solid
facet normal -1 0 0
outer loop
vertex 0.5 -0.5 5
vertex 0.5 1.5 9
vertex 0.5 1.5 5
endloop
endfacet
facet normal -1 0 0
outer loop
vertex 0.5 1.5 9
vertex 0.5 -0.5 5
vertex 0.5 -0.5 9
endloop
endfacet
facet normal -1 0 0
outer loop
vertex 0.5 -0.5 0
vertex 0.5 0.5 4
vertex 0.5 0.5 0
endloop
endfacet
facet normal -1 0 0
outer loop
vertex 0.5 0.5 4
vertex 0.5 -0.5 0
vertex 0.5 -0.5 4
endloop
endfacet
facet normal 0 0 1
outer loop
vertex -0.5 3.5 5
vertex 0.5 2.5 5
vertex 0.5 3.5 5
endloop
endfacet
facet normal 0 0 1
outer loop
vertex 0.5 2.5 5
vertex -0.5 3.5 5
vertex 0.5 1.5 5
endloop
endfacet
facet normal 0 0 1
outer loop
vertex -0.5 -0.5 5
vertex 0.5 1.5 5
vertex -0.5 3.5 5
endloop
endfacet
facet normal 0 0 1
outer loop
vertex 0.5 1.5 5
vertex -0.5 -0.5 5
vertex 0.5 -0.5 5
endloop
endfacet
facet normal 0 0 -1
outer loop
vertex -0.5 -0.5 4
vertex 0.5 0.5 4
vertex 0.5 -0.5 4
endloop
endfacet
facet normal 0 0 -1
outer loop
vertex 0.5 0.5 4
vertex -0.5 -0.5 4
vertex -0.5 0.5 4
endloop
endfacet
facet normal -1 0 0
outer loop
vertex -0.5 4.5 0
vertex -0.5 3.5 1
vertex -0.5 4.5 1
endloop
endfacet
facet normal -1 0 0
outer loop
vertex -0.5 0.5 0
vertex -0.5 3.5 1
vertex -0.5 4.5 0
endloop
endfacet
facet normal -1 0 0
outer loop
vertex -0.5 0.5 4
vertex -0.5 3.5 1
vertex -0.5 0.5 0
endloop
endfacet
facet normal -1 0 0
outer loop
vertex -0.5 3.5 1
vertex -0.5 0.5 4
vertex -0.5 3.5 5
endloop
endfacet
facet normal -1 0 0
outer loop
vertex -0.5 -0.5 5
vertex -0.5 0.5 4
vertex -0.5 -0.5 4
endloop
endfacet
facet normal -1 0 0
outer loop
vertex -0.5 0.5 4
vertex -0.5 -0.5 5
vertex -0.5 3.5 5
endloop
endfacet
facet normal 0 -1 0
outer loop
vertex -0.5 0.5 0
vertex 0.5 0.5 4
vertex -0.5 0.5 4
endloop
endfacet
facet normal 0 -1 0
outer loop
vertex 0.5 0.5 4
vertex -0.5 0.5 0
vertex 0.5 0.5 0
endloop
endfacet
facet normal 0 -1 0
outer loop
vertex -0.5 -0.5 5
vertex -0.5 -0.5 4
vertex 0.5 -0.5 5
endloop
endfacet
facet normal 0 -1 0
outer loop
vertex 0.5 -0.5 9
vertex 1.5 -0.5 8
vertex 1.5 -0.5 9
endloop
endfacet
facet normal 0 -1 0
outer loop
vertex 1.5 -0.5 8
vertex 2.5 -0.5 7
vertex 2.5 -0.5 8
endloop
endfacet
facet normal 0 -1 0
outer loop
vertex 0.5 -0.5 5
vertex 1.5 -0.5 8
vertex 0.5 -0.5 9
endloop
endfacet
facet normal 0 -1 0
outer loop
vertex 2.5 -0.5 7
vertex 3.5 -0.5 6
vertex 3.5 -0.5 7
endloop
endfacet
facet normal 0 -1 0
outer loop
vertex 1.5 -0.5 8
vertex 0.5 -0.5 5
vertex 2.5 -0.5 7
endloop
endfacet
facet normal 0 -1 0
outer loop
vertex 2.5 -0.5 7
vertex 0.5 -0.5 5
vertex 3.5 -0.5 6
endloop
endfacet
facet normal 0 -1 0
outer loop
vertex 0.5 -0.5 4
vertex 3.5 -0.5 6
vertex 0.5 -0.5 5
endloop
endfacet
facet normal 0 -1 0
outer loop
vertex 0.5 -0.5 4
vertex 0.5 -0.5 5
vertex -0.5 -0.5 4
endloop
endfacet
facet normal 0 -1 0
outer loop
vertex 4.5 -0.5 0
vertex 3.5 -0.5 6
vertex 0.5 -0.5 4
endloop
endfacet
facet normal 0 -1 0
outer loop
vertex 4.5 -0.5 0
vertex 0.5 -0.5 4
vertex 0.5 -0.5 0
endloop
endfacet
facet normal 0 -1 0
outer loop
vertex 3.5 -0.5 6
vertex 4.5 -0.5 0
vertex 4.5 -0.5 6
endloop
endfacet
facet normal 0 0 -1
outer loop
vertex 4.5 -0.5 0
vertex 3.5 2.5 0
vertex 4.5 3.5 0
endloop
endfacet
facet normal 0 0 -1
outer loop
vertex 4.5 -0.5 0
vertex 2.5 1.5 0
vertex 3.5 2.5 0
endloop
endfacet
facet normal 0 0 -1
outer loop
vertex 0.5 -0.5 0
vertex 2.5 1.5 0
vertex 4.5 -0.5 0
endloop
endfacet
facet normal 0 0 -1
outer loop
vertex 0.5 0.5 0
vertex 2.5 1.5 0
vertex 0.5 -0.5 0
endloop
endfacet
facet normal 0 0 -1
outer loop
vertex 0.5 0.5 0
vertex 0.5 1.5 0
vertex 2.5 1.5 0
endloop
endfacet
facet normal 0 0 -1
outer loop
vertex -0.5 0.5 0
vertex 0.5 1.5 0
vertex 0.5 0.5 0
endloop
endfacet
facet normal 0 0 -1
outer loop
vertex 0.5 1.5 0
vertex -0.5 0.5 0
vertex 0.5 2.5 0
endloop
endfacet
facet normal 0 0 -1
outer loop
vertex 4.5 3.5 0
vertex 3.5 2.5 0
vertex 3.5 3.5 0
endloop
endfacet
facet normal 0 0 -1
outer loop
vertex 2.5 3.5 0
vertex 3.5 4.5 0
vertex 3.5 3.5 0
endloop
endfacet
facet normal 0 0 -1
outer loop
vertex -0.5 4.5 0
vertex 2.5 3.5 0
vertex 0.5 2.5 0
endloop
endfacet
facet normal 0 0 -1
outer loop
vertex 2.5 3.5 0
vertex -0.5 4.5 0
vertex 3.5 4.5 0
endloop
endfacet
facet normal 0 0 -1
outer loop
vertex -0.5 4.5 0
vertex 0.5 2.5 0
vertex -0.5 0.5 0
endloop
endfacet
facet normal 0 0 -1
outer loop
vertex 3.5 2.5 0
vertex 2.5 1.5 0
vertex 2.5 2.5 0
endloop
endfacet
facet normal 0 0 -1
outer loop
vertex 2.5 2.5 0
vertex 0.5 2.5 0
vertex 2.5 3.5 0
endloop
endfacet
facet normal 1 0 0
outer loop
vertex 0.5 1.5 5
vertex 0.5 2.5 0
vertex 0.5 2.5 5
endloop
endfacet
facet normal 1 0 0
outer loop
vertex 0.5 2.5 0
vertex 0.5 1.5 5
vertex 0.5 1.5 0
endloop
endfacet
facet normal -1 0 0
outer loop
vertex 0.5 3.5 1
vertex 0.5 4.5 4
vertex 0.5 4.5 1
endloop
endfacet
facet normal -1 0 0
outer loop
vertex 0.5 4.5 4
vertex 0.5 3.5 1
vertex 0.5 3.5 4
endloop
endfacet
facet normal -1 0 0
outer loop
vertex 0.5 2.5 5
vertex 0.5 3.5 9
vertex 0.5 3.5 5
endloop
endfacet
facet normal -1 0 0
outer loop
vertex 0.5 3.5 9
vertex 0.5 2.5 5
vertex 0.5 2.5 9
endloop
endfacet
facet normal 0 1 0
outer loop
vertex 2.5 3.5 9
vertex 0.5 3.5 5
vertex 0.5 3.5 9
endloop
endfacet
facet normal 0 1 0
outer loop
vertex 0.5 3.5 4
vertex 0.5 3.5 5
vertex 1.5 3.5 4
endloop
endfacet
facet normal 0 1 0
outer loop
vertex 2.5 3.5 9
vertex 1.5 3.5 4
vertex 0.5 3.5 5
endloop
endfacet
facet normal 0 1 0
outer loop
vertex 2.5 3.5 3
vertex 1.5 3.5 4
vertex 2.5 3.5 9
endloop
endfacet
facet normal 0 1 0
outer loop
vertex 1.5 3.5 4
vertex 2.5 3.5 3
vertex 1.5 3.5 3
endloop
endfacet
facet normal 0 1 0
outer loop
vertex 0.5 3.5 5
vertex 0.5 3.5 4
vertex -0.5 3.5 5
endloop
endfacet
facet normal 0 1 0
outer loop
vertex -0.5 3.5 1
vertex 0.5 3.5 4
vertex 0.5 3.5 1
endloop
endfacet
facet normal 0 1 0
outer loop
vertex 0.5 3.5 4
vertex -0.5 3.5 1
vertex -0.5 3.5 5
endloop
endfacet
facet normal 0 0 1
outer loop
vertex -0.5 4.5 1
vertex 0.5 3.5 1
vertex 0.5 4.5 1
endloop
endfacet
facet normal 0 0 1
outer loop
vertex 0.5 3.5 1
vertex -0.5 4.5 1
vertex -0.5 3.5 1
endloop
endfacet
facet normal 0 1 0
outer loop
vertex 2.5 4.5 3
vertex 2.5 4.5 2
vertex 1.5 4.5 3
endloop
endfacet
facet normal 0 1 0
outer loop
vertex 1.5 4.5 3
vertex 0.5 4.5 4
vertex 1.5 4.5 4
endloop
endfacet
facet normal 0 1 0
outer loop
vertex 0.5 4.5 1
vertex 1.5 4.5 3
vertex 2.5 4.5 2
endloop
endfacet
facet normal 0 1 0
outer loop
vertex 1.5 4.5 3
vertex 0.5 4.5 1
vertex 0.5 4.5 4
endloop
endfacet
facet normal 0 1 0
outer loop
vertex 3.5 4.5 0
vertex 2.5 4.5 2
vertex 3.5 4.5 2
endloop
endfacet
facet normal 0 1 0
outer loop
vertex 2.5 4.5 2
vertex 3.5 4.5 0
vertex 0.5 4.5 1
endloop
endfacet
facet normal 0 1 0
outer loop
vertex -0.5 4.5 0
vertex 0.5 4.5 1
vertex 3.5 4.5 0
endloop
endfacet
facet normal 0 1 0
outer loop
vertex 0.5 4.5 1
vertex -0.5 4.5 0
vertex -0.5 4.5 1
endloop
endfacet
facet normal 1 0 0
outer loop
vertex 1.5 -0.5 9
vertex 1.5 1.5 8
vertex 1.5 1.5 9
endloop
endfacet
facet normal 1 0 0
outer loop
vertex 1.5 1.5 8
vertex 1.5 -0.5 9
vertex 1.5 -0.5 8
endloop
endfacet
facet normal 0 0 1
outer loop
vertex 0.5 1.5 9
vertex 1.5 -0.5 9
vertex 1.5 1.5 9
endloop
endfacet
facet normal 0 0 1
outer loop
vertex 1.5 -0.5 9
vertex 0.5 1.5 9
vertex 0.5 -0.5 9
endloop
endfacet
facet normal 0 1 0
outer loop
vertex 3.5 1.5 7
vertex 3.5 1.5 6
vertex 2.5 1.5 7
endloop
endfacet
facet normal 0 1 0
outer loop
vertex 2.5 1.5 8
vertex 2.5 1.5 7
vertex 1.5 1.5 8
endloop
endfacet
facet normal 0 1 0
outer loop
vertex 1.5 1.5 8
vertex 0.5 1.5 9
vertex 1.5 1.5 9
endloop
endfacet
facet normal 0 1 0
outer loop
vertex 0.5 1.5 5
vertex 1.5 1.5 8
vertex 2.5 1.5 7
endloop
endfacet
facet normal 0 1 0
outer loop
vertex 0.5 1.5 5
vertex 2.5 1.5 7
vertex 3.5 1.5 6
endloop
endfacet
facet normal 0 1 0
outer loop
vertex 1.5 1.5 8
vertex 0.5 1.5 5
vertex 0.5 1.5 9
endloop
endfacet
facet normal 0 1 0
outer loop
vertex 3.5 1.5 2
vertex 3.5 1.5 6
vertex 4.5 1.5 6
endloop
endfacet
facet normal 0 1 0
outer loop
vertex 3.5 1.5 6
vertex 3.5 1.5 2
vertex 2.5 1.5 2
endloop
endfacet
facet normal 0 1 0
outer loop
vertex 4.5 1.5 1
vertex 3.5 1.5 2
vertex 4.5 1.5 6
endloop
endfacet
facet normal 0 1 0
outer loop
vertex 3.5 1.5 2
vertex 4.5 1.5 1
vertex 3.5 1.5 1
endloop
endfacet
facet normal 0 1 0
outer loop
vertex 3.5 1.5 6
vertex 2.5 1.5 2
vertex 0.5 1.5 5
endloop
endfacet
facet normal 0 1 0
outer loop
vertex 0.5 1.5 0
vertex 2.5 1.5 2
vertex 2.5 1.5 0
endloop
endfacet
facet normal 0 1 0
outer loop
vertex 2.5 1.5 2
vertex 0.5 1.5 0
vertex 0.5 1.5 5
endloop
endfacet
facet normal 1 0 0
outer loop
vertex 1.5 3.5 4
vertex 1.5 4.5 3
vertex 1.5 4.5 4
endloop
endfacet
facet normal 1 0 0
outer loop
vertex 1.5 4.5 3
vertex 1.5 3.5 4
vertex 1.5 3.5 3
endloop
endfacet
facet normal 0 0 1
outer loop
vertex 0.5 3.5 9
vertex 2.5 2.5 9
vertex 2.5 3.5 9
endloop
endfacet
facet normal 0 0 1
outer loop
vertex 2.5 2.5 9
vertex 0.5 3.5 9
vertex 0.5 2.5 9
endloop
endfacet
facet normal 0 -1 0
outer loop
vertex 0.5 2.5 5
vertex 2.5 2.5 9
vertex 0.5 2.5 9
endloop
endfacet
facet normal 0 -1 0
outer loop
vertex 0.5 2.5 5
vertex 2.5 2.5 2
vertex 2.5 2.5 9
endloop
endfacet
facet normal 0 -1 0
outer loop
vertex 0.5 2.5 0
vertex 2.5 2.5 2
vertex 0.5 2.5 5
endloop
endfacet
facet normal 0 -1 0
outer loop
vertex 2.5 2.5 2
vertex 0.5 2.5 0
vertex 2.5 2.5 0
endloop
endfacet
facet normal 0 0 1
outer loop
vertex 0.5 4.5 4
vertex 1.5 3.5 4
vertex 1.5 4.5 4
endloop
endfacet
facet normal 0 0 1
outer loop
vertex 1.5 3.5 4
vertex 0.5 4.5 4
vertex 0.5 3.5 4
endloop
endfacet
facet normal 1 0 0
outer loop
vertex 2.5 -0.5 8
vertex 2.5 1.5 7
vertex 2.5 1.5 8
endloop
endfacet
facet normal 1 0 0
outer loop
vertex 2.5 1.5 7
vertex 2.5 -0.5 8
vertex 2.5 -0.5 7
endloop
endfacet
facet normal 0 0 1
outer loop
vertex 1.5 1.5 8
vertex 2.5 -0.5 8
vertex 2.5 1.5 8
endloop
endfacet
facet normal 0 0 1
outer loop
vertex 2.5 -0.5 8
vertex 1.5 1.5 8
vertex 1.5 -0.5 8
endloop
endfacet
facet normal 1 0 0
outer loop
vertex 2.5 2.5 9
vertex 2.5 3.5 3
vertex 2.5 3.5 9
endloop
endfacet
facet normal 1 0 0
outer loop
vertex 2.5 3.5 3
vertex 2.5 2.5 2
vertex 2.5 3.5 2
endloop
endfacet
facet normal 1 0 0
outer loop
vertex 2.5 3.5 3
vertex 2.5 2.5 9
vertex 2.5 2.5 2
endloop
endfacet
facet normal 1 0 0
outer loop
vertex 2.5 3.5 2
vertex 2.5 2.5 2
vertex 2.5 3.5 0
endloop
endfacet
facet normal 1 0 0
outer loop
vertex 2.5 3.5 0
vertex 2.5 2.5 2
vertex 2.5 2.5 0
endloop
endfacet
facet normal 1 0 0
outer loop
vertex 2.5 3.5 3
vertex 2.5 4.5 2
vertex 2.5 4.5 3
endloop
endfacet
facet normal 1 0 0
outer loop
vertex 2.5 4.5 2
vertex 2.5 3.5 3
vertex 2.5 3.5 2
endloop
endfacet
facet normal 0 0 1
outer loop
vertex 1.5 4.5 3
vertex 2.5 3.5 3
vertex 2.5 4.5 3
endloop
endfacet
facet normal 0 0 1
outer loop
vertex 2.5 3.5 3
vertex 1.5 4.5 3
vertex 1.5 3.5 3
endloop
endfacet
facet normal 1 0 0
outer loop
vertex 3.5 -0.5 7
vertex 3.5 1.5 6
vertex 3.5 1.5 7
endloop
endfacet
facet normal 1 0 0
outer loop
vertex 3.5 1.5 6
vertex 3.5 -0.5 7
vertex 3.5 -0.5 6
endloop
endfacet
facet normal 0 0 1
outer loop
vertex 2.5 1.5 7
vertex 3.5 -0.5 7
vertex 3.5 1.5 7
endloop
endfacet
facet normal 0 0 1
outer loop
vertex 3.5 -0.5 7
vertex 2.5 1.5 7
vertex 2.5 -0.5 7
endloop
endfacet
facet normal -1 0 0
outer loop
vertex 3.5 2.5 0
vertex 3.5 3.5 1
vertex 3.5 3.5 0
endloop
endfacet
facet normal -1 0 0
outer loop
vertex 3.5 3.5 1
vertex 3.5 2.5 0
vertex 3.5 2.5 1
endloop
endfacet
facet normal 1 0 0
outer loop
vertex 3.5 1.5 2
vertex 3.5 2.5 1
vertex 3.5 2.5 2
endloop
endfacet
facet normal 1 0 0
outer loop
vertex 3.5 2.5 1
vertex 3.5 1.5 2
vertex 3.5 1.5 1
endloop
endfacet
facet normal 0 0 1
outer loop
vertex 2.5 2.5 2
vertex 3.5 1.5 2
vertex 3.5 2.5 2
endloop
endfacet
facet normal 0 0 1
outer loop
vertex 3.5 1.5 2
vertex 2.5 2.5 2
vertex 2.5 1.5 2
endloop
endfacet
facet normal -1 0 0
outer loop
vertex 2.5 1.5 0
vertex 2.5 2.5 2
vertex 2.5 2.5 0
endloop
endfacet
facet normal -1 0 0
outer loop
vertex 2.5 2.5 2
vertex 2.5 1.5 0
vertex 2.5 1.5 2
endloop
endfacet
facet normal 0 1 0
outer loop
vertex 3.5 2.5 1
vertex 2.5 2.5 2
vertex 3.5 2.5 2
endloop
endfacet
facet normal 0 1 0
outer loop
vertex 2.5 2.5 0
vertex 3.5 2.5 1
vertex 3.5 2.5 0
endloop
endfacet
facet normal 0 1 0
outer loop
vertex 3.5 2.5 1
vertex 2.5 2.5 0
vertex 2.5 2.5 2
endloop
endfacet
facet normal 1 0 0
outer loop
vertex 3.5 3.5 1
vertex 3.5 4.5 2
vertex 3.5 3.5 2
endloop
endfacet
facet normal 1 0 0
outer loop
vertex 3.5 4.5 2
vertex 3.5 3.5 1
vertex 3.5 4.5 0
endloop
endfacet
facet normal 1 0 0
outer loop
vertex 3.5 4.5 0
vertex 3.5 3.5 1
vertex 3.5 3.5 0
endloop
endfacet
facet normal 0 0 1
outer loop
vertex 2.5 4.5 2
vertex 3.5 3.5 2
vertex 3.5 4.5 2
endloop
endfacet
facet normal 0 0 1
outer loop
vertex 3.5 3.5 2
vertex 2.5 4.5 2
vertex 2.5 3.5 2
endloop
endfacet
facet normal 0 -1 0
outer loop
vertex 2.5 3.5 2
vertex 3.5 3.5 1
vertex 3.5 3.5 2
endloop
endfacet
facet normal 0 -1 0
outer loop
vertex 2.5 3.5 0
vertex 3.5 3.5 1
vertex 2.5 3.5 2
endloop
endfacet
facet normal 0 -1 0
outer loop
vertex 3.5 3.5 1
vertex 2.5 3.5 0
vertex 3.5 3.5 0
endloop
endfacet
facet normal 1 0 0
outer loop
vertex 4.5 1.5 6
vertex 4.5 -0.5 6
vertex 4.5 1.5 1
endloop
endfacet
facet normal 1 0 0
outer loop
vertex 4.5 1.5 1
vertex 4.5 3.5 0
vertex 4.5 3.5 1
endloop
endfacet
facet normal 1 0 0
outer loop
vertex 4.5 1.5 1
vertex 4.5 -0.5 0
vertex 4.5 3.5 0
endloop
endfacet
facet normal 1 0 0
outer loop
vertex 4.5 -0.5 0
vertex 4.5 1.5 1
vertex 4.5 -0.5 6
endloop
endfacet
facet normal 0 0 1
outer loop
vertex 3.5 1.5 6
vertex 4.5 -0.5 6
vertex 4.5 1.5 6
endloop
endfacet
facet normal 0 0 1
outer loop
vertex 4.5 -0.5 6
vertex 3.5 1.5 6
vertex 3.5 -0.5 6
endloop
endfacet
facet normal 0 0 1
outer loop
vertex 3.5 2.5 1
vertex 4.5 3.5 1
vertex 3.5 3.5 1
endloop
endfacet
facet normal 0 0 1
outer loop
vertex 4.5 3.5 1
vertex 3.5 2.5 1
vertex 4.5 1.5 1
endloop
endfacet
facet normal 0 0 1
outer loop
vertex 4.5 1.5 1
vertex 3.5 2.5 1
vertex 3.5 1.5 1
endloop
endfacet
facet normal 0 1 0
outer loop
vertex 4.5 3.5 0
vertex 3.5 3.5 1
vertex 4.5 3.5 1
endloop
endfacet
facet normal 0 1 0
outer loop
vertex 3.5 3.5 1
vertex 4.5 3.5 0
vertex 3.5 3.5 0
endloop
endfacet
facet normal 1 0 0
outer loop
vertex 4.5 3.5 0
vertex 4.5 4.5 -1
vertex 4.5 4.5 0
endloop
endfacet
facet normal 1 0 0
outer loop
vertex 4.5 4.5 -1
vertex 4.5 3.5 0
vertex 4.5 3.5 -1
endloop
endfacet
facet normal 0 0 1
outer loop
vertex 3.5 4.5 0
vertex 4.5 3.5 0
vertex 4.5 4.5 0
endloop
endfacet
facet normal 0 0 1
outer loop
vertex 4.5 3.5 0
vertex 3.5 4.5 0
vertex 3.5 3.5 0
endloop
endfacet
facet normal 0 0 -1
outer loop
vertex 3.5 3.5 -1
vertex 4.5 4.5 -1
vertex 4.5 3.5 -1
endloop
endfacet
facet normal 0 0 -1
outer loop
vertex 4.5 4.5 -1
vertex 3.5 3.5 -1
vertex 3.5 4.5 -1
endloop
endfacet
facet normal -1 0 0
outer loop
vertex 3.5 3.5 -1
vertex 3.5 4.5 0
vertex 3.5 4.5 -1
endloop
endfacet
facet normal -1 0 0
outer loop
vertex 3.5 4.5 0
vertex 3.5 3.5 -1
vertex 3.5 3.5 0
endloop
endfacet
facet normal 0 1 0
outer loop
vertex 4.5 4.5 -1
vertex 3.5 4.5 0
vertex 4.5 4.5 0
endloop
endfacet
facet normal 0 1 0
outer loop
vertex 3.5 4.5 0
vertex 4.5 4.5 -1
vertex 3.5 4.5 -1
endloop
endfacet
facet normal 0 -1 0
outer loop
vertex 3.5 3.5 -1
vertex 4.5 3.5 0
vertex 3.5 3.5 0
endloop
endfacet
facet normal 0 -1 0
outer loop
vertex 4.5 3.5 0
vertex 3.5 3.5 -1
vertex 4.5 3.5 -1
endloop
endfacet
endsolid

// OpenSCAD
union() {
    translate([0, 0, 4.5]) color([1, 0, 0]) cube([1, 1, 1], center=true);
    translate([0, 1, 2.5]) cube([1, 1, 5], center=true);
    translate([0, 2, 2.5]) cube([1, 1, 5], center=true);
    translate([0, 3, 2.5]) cube([1, 1, 5], center=true);
    translate([0, 4, 0.5]) cube([1, 1, 1], center=true);
    translate([1, 0, 4.5]) cube([1, 1, 9], center=true);
    translate([1, 1, 4.5]) cube([1, 1, 9], center=true);
    translate([1, 3, 4.5]) cube([1, 1, 9], center=true);
    translate([1, 4, 2.0]) cube([1, 1, 4], center=true);
    translate([2, 0, 4.0]) cube([1, 1, 8], center=true);
    translate([2, 1, 4.0]) cube([1, 1, 8], center=true);
    translate([2, 3, 4.5]) cube([1, 1, 9], center=true);
    translate([2, 4, 1.5]) cube([1, 1, 3], center=true);
    translate([3, 0, 3.5]) cube([1, 1, 7], center=true);
    translate([3, 1, 3.5]) cube([1, 1, 7], center=true);
    translate([3, 2, 1.0]) cube([1, 1, 2], center=true);
    translate([3, 4, 1.0]) cube([1, 1, 2], center=true);
    translate([4, 0, 3.0]) cube([1, 1, 6], center=true);
    translate([4, 1, 3.0]) cube([1, 1, 6], center=true);
    translate([4, 2, 0.5]) cube([1, 1, 1], center=true);
    translate([4, 3, 0.5]) cube([1, 1, 1], center=true);
    translate([4, 4, -0.5]) color([0, 0, 1]) cube([1, 1, 1], center=true);
}
